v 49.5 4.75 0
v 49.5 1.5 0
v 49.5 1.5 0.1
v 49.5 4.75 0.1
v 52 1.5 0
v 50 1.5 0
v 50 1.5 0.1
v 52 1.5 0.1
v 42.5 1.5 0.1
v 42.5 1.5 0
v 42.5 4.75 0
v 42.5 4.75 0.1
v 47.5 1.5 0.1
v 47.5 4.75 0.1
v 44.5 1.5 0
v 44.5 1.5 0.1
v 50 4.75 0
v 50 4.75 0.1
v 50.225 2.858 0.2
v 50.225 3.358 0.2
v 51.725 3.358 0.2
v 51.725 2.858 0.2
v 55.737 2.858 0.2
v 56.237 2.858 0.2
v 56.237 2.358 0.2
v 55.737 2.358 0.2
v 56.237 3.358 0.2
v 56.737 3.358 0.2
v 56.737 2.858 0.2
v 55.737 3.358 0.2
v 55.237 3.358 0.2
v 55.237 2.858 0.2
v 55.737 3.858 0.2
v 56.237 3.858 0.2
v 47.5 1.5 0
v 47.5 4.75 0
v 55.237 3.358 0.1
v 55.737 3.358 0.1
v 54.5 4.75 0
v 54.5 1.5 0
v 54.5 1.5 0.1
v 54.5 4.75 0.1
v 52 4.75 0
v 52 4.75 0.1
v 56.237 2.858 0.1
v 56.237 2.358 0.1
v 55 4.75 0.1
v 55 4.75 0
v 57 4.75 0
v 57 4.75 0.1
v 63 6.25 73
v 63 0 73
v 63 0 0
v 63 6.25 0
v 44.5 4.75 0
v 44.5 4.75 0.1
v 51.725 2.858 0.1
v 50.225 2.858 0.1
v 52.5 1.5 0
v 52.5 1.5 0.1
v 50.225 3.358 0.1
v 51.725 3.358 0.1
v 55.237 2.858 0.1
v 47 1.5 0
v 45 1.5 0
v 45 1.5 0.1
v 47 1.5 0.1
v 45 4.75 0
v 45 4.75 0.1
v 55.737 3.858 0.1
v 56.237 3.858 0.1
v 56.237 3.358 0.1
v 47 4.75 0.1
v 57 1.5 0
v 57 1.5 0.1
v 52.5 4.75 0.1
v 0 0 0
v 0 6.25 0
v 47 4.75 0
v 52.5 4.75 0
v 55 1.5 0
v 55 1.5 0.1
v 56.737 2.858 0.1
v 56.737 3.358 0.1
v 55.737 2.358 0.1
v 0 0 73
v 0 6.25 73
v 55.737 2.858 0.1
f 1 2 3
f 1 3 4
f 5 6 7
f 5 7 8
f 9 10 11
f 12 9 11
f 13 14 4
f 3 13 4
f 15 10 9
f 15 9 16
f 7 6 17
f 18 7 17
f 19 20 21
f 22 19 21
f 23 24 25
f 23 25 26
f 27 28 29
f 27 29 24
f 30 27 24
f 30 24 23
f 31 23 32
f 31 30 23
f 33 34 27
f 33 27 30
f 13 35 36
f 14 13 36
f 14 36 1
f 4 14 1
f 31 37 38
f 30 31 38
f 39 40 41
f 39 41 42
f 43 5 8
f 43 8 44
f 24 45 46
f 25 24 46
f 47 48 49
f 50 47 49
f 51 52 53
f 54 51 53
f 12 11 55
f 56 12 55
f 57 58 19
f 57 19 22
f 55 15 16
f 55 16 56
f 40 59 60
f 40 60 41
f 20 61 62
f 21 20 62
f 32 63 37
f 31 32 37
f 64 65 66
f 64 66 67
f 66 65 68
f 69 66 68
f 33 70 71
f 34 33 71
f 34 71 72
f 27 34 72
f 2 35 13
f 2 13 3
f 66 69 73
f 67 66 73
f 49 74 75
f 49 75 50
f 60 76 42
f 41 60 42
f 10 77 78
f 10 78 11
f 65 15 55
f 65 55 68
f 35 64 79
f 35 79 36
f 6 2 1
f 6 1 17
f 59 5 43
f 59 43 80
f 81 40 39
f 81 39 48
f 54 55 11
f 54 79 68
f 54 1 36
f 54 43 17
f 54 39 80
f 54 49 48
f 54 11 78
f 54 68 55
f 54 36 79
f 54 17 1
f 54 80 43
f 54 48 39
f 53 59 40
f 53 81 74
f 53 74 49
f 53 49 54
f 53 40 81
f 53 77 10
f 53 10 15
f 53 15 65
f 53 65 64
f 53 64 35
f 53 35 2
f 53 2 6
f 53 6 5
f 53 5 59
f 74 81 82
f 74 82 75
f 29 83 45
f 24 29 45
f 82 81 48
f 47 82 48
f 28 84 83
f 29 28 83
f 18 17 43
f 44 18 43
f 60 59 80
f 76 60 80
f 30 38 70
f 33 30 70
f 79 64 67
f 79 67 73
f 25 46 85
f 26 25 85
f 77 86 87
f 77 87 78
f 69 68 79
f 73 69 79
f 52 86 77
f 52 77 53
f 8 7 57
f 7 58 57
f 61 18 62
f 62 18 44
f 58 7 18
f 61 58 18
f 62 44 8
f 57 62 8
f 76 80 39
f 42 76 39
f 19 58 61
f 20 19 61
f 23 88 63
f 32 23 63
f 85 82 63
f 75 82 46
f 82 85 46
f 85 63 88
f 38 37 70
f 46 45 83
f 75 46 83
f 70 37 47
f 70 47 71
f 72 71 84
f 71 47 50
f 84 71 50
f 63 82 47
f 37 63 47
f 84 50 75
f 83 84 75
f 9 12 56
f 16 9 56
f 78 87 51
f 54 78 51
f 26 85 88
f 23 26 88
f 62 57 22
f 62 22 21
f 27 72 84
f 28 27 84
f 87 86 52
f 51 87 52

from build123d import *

# Parameters (mm, degrees)
SKETCH1_W           = 63
SKETCH1_H           = 73
BOSS_EXTRUDE1_DEPTH = 6.25
SKETCH2_W           = 2
SKETCH2_H           = 3.25
CUT_EXTRUDE1_DEPTH  = 0.1
SKETCH3_W           = 1.5
SKETCH3_H           = 0.5
CUT_EXTRUDE2_DEPTH  = 0.2


with BuildPart() as part:
    # Sketch1 → Boss-Extrude1 (new body)
    with BuildSketch(Plane(origin=(0, 0, 0), x_dir=(1, 0, 0), z_dir=(0, 1, 0))):
        with Locations((31.5, -36.5)):
            Rectangle(SKETCH1_W, SKETCH1_H)
    extrude(amount=BOSS_EXTRUDE1_DEPTH)

    # Sketch2 → Cut-Extrude1 (cut)
    with BuildSketch(Plane.XY):
        with Locations((56, 3.125)):
            Rectangle(SKETCH2_W, SKETCH2_H)
        with Locations((53.5, 3.125)):
            Rectangle(SKETCH2_W, SKETCH2_H)
        with Locations((51, 3.125)):
            Rectangle(SKETCH2_W, SKETCH2_H)
        with Locations((48.5, 3.125)):
            Rectangle(SKETCH2_W, SKETCH2_H)
        with Locations((46, 3.125)):
            Rectangle(SKETCH2_W, SKETCH2_H)
        with Locations((43.5, 3.125)):
            Rectangle(SKETCH2_W, SKETCH2_H)
    extrude(amount=CUT_EXTRUDE1_DEPTH, mode=Mode.SUBTRACT)

    # Sketch3 → Cut-Extrude2 (cut)
    with BuildSketch(Plane.XY):
        Polygon((55.737279888, 2.358063924), (55.737279888, 2.858063924), (55.237279888, 2.858063924), (55.237279888, 3.358063924), (55.737279888, 3.358063924), (55.737279888, 3.858063924), (56.237279888, 3.858063924), (56.237279888, 3.358063924), (56.737279888, 3.358063924), (56.737279888, 2.858063924), (56.237279888, 2.858063924), (56.237279888, 2.358063924), align=None)
        with Locations((50.97451755, 3.108063924)):
            Rectangle(SKETCH3_W, SKETCH3_H)
    extrude(amount=CUT_EXTRUDE2_DEPTH, mode=Mode.SUBTRACT)


solid = part.part
